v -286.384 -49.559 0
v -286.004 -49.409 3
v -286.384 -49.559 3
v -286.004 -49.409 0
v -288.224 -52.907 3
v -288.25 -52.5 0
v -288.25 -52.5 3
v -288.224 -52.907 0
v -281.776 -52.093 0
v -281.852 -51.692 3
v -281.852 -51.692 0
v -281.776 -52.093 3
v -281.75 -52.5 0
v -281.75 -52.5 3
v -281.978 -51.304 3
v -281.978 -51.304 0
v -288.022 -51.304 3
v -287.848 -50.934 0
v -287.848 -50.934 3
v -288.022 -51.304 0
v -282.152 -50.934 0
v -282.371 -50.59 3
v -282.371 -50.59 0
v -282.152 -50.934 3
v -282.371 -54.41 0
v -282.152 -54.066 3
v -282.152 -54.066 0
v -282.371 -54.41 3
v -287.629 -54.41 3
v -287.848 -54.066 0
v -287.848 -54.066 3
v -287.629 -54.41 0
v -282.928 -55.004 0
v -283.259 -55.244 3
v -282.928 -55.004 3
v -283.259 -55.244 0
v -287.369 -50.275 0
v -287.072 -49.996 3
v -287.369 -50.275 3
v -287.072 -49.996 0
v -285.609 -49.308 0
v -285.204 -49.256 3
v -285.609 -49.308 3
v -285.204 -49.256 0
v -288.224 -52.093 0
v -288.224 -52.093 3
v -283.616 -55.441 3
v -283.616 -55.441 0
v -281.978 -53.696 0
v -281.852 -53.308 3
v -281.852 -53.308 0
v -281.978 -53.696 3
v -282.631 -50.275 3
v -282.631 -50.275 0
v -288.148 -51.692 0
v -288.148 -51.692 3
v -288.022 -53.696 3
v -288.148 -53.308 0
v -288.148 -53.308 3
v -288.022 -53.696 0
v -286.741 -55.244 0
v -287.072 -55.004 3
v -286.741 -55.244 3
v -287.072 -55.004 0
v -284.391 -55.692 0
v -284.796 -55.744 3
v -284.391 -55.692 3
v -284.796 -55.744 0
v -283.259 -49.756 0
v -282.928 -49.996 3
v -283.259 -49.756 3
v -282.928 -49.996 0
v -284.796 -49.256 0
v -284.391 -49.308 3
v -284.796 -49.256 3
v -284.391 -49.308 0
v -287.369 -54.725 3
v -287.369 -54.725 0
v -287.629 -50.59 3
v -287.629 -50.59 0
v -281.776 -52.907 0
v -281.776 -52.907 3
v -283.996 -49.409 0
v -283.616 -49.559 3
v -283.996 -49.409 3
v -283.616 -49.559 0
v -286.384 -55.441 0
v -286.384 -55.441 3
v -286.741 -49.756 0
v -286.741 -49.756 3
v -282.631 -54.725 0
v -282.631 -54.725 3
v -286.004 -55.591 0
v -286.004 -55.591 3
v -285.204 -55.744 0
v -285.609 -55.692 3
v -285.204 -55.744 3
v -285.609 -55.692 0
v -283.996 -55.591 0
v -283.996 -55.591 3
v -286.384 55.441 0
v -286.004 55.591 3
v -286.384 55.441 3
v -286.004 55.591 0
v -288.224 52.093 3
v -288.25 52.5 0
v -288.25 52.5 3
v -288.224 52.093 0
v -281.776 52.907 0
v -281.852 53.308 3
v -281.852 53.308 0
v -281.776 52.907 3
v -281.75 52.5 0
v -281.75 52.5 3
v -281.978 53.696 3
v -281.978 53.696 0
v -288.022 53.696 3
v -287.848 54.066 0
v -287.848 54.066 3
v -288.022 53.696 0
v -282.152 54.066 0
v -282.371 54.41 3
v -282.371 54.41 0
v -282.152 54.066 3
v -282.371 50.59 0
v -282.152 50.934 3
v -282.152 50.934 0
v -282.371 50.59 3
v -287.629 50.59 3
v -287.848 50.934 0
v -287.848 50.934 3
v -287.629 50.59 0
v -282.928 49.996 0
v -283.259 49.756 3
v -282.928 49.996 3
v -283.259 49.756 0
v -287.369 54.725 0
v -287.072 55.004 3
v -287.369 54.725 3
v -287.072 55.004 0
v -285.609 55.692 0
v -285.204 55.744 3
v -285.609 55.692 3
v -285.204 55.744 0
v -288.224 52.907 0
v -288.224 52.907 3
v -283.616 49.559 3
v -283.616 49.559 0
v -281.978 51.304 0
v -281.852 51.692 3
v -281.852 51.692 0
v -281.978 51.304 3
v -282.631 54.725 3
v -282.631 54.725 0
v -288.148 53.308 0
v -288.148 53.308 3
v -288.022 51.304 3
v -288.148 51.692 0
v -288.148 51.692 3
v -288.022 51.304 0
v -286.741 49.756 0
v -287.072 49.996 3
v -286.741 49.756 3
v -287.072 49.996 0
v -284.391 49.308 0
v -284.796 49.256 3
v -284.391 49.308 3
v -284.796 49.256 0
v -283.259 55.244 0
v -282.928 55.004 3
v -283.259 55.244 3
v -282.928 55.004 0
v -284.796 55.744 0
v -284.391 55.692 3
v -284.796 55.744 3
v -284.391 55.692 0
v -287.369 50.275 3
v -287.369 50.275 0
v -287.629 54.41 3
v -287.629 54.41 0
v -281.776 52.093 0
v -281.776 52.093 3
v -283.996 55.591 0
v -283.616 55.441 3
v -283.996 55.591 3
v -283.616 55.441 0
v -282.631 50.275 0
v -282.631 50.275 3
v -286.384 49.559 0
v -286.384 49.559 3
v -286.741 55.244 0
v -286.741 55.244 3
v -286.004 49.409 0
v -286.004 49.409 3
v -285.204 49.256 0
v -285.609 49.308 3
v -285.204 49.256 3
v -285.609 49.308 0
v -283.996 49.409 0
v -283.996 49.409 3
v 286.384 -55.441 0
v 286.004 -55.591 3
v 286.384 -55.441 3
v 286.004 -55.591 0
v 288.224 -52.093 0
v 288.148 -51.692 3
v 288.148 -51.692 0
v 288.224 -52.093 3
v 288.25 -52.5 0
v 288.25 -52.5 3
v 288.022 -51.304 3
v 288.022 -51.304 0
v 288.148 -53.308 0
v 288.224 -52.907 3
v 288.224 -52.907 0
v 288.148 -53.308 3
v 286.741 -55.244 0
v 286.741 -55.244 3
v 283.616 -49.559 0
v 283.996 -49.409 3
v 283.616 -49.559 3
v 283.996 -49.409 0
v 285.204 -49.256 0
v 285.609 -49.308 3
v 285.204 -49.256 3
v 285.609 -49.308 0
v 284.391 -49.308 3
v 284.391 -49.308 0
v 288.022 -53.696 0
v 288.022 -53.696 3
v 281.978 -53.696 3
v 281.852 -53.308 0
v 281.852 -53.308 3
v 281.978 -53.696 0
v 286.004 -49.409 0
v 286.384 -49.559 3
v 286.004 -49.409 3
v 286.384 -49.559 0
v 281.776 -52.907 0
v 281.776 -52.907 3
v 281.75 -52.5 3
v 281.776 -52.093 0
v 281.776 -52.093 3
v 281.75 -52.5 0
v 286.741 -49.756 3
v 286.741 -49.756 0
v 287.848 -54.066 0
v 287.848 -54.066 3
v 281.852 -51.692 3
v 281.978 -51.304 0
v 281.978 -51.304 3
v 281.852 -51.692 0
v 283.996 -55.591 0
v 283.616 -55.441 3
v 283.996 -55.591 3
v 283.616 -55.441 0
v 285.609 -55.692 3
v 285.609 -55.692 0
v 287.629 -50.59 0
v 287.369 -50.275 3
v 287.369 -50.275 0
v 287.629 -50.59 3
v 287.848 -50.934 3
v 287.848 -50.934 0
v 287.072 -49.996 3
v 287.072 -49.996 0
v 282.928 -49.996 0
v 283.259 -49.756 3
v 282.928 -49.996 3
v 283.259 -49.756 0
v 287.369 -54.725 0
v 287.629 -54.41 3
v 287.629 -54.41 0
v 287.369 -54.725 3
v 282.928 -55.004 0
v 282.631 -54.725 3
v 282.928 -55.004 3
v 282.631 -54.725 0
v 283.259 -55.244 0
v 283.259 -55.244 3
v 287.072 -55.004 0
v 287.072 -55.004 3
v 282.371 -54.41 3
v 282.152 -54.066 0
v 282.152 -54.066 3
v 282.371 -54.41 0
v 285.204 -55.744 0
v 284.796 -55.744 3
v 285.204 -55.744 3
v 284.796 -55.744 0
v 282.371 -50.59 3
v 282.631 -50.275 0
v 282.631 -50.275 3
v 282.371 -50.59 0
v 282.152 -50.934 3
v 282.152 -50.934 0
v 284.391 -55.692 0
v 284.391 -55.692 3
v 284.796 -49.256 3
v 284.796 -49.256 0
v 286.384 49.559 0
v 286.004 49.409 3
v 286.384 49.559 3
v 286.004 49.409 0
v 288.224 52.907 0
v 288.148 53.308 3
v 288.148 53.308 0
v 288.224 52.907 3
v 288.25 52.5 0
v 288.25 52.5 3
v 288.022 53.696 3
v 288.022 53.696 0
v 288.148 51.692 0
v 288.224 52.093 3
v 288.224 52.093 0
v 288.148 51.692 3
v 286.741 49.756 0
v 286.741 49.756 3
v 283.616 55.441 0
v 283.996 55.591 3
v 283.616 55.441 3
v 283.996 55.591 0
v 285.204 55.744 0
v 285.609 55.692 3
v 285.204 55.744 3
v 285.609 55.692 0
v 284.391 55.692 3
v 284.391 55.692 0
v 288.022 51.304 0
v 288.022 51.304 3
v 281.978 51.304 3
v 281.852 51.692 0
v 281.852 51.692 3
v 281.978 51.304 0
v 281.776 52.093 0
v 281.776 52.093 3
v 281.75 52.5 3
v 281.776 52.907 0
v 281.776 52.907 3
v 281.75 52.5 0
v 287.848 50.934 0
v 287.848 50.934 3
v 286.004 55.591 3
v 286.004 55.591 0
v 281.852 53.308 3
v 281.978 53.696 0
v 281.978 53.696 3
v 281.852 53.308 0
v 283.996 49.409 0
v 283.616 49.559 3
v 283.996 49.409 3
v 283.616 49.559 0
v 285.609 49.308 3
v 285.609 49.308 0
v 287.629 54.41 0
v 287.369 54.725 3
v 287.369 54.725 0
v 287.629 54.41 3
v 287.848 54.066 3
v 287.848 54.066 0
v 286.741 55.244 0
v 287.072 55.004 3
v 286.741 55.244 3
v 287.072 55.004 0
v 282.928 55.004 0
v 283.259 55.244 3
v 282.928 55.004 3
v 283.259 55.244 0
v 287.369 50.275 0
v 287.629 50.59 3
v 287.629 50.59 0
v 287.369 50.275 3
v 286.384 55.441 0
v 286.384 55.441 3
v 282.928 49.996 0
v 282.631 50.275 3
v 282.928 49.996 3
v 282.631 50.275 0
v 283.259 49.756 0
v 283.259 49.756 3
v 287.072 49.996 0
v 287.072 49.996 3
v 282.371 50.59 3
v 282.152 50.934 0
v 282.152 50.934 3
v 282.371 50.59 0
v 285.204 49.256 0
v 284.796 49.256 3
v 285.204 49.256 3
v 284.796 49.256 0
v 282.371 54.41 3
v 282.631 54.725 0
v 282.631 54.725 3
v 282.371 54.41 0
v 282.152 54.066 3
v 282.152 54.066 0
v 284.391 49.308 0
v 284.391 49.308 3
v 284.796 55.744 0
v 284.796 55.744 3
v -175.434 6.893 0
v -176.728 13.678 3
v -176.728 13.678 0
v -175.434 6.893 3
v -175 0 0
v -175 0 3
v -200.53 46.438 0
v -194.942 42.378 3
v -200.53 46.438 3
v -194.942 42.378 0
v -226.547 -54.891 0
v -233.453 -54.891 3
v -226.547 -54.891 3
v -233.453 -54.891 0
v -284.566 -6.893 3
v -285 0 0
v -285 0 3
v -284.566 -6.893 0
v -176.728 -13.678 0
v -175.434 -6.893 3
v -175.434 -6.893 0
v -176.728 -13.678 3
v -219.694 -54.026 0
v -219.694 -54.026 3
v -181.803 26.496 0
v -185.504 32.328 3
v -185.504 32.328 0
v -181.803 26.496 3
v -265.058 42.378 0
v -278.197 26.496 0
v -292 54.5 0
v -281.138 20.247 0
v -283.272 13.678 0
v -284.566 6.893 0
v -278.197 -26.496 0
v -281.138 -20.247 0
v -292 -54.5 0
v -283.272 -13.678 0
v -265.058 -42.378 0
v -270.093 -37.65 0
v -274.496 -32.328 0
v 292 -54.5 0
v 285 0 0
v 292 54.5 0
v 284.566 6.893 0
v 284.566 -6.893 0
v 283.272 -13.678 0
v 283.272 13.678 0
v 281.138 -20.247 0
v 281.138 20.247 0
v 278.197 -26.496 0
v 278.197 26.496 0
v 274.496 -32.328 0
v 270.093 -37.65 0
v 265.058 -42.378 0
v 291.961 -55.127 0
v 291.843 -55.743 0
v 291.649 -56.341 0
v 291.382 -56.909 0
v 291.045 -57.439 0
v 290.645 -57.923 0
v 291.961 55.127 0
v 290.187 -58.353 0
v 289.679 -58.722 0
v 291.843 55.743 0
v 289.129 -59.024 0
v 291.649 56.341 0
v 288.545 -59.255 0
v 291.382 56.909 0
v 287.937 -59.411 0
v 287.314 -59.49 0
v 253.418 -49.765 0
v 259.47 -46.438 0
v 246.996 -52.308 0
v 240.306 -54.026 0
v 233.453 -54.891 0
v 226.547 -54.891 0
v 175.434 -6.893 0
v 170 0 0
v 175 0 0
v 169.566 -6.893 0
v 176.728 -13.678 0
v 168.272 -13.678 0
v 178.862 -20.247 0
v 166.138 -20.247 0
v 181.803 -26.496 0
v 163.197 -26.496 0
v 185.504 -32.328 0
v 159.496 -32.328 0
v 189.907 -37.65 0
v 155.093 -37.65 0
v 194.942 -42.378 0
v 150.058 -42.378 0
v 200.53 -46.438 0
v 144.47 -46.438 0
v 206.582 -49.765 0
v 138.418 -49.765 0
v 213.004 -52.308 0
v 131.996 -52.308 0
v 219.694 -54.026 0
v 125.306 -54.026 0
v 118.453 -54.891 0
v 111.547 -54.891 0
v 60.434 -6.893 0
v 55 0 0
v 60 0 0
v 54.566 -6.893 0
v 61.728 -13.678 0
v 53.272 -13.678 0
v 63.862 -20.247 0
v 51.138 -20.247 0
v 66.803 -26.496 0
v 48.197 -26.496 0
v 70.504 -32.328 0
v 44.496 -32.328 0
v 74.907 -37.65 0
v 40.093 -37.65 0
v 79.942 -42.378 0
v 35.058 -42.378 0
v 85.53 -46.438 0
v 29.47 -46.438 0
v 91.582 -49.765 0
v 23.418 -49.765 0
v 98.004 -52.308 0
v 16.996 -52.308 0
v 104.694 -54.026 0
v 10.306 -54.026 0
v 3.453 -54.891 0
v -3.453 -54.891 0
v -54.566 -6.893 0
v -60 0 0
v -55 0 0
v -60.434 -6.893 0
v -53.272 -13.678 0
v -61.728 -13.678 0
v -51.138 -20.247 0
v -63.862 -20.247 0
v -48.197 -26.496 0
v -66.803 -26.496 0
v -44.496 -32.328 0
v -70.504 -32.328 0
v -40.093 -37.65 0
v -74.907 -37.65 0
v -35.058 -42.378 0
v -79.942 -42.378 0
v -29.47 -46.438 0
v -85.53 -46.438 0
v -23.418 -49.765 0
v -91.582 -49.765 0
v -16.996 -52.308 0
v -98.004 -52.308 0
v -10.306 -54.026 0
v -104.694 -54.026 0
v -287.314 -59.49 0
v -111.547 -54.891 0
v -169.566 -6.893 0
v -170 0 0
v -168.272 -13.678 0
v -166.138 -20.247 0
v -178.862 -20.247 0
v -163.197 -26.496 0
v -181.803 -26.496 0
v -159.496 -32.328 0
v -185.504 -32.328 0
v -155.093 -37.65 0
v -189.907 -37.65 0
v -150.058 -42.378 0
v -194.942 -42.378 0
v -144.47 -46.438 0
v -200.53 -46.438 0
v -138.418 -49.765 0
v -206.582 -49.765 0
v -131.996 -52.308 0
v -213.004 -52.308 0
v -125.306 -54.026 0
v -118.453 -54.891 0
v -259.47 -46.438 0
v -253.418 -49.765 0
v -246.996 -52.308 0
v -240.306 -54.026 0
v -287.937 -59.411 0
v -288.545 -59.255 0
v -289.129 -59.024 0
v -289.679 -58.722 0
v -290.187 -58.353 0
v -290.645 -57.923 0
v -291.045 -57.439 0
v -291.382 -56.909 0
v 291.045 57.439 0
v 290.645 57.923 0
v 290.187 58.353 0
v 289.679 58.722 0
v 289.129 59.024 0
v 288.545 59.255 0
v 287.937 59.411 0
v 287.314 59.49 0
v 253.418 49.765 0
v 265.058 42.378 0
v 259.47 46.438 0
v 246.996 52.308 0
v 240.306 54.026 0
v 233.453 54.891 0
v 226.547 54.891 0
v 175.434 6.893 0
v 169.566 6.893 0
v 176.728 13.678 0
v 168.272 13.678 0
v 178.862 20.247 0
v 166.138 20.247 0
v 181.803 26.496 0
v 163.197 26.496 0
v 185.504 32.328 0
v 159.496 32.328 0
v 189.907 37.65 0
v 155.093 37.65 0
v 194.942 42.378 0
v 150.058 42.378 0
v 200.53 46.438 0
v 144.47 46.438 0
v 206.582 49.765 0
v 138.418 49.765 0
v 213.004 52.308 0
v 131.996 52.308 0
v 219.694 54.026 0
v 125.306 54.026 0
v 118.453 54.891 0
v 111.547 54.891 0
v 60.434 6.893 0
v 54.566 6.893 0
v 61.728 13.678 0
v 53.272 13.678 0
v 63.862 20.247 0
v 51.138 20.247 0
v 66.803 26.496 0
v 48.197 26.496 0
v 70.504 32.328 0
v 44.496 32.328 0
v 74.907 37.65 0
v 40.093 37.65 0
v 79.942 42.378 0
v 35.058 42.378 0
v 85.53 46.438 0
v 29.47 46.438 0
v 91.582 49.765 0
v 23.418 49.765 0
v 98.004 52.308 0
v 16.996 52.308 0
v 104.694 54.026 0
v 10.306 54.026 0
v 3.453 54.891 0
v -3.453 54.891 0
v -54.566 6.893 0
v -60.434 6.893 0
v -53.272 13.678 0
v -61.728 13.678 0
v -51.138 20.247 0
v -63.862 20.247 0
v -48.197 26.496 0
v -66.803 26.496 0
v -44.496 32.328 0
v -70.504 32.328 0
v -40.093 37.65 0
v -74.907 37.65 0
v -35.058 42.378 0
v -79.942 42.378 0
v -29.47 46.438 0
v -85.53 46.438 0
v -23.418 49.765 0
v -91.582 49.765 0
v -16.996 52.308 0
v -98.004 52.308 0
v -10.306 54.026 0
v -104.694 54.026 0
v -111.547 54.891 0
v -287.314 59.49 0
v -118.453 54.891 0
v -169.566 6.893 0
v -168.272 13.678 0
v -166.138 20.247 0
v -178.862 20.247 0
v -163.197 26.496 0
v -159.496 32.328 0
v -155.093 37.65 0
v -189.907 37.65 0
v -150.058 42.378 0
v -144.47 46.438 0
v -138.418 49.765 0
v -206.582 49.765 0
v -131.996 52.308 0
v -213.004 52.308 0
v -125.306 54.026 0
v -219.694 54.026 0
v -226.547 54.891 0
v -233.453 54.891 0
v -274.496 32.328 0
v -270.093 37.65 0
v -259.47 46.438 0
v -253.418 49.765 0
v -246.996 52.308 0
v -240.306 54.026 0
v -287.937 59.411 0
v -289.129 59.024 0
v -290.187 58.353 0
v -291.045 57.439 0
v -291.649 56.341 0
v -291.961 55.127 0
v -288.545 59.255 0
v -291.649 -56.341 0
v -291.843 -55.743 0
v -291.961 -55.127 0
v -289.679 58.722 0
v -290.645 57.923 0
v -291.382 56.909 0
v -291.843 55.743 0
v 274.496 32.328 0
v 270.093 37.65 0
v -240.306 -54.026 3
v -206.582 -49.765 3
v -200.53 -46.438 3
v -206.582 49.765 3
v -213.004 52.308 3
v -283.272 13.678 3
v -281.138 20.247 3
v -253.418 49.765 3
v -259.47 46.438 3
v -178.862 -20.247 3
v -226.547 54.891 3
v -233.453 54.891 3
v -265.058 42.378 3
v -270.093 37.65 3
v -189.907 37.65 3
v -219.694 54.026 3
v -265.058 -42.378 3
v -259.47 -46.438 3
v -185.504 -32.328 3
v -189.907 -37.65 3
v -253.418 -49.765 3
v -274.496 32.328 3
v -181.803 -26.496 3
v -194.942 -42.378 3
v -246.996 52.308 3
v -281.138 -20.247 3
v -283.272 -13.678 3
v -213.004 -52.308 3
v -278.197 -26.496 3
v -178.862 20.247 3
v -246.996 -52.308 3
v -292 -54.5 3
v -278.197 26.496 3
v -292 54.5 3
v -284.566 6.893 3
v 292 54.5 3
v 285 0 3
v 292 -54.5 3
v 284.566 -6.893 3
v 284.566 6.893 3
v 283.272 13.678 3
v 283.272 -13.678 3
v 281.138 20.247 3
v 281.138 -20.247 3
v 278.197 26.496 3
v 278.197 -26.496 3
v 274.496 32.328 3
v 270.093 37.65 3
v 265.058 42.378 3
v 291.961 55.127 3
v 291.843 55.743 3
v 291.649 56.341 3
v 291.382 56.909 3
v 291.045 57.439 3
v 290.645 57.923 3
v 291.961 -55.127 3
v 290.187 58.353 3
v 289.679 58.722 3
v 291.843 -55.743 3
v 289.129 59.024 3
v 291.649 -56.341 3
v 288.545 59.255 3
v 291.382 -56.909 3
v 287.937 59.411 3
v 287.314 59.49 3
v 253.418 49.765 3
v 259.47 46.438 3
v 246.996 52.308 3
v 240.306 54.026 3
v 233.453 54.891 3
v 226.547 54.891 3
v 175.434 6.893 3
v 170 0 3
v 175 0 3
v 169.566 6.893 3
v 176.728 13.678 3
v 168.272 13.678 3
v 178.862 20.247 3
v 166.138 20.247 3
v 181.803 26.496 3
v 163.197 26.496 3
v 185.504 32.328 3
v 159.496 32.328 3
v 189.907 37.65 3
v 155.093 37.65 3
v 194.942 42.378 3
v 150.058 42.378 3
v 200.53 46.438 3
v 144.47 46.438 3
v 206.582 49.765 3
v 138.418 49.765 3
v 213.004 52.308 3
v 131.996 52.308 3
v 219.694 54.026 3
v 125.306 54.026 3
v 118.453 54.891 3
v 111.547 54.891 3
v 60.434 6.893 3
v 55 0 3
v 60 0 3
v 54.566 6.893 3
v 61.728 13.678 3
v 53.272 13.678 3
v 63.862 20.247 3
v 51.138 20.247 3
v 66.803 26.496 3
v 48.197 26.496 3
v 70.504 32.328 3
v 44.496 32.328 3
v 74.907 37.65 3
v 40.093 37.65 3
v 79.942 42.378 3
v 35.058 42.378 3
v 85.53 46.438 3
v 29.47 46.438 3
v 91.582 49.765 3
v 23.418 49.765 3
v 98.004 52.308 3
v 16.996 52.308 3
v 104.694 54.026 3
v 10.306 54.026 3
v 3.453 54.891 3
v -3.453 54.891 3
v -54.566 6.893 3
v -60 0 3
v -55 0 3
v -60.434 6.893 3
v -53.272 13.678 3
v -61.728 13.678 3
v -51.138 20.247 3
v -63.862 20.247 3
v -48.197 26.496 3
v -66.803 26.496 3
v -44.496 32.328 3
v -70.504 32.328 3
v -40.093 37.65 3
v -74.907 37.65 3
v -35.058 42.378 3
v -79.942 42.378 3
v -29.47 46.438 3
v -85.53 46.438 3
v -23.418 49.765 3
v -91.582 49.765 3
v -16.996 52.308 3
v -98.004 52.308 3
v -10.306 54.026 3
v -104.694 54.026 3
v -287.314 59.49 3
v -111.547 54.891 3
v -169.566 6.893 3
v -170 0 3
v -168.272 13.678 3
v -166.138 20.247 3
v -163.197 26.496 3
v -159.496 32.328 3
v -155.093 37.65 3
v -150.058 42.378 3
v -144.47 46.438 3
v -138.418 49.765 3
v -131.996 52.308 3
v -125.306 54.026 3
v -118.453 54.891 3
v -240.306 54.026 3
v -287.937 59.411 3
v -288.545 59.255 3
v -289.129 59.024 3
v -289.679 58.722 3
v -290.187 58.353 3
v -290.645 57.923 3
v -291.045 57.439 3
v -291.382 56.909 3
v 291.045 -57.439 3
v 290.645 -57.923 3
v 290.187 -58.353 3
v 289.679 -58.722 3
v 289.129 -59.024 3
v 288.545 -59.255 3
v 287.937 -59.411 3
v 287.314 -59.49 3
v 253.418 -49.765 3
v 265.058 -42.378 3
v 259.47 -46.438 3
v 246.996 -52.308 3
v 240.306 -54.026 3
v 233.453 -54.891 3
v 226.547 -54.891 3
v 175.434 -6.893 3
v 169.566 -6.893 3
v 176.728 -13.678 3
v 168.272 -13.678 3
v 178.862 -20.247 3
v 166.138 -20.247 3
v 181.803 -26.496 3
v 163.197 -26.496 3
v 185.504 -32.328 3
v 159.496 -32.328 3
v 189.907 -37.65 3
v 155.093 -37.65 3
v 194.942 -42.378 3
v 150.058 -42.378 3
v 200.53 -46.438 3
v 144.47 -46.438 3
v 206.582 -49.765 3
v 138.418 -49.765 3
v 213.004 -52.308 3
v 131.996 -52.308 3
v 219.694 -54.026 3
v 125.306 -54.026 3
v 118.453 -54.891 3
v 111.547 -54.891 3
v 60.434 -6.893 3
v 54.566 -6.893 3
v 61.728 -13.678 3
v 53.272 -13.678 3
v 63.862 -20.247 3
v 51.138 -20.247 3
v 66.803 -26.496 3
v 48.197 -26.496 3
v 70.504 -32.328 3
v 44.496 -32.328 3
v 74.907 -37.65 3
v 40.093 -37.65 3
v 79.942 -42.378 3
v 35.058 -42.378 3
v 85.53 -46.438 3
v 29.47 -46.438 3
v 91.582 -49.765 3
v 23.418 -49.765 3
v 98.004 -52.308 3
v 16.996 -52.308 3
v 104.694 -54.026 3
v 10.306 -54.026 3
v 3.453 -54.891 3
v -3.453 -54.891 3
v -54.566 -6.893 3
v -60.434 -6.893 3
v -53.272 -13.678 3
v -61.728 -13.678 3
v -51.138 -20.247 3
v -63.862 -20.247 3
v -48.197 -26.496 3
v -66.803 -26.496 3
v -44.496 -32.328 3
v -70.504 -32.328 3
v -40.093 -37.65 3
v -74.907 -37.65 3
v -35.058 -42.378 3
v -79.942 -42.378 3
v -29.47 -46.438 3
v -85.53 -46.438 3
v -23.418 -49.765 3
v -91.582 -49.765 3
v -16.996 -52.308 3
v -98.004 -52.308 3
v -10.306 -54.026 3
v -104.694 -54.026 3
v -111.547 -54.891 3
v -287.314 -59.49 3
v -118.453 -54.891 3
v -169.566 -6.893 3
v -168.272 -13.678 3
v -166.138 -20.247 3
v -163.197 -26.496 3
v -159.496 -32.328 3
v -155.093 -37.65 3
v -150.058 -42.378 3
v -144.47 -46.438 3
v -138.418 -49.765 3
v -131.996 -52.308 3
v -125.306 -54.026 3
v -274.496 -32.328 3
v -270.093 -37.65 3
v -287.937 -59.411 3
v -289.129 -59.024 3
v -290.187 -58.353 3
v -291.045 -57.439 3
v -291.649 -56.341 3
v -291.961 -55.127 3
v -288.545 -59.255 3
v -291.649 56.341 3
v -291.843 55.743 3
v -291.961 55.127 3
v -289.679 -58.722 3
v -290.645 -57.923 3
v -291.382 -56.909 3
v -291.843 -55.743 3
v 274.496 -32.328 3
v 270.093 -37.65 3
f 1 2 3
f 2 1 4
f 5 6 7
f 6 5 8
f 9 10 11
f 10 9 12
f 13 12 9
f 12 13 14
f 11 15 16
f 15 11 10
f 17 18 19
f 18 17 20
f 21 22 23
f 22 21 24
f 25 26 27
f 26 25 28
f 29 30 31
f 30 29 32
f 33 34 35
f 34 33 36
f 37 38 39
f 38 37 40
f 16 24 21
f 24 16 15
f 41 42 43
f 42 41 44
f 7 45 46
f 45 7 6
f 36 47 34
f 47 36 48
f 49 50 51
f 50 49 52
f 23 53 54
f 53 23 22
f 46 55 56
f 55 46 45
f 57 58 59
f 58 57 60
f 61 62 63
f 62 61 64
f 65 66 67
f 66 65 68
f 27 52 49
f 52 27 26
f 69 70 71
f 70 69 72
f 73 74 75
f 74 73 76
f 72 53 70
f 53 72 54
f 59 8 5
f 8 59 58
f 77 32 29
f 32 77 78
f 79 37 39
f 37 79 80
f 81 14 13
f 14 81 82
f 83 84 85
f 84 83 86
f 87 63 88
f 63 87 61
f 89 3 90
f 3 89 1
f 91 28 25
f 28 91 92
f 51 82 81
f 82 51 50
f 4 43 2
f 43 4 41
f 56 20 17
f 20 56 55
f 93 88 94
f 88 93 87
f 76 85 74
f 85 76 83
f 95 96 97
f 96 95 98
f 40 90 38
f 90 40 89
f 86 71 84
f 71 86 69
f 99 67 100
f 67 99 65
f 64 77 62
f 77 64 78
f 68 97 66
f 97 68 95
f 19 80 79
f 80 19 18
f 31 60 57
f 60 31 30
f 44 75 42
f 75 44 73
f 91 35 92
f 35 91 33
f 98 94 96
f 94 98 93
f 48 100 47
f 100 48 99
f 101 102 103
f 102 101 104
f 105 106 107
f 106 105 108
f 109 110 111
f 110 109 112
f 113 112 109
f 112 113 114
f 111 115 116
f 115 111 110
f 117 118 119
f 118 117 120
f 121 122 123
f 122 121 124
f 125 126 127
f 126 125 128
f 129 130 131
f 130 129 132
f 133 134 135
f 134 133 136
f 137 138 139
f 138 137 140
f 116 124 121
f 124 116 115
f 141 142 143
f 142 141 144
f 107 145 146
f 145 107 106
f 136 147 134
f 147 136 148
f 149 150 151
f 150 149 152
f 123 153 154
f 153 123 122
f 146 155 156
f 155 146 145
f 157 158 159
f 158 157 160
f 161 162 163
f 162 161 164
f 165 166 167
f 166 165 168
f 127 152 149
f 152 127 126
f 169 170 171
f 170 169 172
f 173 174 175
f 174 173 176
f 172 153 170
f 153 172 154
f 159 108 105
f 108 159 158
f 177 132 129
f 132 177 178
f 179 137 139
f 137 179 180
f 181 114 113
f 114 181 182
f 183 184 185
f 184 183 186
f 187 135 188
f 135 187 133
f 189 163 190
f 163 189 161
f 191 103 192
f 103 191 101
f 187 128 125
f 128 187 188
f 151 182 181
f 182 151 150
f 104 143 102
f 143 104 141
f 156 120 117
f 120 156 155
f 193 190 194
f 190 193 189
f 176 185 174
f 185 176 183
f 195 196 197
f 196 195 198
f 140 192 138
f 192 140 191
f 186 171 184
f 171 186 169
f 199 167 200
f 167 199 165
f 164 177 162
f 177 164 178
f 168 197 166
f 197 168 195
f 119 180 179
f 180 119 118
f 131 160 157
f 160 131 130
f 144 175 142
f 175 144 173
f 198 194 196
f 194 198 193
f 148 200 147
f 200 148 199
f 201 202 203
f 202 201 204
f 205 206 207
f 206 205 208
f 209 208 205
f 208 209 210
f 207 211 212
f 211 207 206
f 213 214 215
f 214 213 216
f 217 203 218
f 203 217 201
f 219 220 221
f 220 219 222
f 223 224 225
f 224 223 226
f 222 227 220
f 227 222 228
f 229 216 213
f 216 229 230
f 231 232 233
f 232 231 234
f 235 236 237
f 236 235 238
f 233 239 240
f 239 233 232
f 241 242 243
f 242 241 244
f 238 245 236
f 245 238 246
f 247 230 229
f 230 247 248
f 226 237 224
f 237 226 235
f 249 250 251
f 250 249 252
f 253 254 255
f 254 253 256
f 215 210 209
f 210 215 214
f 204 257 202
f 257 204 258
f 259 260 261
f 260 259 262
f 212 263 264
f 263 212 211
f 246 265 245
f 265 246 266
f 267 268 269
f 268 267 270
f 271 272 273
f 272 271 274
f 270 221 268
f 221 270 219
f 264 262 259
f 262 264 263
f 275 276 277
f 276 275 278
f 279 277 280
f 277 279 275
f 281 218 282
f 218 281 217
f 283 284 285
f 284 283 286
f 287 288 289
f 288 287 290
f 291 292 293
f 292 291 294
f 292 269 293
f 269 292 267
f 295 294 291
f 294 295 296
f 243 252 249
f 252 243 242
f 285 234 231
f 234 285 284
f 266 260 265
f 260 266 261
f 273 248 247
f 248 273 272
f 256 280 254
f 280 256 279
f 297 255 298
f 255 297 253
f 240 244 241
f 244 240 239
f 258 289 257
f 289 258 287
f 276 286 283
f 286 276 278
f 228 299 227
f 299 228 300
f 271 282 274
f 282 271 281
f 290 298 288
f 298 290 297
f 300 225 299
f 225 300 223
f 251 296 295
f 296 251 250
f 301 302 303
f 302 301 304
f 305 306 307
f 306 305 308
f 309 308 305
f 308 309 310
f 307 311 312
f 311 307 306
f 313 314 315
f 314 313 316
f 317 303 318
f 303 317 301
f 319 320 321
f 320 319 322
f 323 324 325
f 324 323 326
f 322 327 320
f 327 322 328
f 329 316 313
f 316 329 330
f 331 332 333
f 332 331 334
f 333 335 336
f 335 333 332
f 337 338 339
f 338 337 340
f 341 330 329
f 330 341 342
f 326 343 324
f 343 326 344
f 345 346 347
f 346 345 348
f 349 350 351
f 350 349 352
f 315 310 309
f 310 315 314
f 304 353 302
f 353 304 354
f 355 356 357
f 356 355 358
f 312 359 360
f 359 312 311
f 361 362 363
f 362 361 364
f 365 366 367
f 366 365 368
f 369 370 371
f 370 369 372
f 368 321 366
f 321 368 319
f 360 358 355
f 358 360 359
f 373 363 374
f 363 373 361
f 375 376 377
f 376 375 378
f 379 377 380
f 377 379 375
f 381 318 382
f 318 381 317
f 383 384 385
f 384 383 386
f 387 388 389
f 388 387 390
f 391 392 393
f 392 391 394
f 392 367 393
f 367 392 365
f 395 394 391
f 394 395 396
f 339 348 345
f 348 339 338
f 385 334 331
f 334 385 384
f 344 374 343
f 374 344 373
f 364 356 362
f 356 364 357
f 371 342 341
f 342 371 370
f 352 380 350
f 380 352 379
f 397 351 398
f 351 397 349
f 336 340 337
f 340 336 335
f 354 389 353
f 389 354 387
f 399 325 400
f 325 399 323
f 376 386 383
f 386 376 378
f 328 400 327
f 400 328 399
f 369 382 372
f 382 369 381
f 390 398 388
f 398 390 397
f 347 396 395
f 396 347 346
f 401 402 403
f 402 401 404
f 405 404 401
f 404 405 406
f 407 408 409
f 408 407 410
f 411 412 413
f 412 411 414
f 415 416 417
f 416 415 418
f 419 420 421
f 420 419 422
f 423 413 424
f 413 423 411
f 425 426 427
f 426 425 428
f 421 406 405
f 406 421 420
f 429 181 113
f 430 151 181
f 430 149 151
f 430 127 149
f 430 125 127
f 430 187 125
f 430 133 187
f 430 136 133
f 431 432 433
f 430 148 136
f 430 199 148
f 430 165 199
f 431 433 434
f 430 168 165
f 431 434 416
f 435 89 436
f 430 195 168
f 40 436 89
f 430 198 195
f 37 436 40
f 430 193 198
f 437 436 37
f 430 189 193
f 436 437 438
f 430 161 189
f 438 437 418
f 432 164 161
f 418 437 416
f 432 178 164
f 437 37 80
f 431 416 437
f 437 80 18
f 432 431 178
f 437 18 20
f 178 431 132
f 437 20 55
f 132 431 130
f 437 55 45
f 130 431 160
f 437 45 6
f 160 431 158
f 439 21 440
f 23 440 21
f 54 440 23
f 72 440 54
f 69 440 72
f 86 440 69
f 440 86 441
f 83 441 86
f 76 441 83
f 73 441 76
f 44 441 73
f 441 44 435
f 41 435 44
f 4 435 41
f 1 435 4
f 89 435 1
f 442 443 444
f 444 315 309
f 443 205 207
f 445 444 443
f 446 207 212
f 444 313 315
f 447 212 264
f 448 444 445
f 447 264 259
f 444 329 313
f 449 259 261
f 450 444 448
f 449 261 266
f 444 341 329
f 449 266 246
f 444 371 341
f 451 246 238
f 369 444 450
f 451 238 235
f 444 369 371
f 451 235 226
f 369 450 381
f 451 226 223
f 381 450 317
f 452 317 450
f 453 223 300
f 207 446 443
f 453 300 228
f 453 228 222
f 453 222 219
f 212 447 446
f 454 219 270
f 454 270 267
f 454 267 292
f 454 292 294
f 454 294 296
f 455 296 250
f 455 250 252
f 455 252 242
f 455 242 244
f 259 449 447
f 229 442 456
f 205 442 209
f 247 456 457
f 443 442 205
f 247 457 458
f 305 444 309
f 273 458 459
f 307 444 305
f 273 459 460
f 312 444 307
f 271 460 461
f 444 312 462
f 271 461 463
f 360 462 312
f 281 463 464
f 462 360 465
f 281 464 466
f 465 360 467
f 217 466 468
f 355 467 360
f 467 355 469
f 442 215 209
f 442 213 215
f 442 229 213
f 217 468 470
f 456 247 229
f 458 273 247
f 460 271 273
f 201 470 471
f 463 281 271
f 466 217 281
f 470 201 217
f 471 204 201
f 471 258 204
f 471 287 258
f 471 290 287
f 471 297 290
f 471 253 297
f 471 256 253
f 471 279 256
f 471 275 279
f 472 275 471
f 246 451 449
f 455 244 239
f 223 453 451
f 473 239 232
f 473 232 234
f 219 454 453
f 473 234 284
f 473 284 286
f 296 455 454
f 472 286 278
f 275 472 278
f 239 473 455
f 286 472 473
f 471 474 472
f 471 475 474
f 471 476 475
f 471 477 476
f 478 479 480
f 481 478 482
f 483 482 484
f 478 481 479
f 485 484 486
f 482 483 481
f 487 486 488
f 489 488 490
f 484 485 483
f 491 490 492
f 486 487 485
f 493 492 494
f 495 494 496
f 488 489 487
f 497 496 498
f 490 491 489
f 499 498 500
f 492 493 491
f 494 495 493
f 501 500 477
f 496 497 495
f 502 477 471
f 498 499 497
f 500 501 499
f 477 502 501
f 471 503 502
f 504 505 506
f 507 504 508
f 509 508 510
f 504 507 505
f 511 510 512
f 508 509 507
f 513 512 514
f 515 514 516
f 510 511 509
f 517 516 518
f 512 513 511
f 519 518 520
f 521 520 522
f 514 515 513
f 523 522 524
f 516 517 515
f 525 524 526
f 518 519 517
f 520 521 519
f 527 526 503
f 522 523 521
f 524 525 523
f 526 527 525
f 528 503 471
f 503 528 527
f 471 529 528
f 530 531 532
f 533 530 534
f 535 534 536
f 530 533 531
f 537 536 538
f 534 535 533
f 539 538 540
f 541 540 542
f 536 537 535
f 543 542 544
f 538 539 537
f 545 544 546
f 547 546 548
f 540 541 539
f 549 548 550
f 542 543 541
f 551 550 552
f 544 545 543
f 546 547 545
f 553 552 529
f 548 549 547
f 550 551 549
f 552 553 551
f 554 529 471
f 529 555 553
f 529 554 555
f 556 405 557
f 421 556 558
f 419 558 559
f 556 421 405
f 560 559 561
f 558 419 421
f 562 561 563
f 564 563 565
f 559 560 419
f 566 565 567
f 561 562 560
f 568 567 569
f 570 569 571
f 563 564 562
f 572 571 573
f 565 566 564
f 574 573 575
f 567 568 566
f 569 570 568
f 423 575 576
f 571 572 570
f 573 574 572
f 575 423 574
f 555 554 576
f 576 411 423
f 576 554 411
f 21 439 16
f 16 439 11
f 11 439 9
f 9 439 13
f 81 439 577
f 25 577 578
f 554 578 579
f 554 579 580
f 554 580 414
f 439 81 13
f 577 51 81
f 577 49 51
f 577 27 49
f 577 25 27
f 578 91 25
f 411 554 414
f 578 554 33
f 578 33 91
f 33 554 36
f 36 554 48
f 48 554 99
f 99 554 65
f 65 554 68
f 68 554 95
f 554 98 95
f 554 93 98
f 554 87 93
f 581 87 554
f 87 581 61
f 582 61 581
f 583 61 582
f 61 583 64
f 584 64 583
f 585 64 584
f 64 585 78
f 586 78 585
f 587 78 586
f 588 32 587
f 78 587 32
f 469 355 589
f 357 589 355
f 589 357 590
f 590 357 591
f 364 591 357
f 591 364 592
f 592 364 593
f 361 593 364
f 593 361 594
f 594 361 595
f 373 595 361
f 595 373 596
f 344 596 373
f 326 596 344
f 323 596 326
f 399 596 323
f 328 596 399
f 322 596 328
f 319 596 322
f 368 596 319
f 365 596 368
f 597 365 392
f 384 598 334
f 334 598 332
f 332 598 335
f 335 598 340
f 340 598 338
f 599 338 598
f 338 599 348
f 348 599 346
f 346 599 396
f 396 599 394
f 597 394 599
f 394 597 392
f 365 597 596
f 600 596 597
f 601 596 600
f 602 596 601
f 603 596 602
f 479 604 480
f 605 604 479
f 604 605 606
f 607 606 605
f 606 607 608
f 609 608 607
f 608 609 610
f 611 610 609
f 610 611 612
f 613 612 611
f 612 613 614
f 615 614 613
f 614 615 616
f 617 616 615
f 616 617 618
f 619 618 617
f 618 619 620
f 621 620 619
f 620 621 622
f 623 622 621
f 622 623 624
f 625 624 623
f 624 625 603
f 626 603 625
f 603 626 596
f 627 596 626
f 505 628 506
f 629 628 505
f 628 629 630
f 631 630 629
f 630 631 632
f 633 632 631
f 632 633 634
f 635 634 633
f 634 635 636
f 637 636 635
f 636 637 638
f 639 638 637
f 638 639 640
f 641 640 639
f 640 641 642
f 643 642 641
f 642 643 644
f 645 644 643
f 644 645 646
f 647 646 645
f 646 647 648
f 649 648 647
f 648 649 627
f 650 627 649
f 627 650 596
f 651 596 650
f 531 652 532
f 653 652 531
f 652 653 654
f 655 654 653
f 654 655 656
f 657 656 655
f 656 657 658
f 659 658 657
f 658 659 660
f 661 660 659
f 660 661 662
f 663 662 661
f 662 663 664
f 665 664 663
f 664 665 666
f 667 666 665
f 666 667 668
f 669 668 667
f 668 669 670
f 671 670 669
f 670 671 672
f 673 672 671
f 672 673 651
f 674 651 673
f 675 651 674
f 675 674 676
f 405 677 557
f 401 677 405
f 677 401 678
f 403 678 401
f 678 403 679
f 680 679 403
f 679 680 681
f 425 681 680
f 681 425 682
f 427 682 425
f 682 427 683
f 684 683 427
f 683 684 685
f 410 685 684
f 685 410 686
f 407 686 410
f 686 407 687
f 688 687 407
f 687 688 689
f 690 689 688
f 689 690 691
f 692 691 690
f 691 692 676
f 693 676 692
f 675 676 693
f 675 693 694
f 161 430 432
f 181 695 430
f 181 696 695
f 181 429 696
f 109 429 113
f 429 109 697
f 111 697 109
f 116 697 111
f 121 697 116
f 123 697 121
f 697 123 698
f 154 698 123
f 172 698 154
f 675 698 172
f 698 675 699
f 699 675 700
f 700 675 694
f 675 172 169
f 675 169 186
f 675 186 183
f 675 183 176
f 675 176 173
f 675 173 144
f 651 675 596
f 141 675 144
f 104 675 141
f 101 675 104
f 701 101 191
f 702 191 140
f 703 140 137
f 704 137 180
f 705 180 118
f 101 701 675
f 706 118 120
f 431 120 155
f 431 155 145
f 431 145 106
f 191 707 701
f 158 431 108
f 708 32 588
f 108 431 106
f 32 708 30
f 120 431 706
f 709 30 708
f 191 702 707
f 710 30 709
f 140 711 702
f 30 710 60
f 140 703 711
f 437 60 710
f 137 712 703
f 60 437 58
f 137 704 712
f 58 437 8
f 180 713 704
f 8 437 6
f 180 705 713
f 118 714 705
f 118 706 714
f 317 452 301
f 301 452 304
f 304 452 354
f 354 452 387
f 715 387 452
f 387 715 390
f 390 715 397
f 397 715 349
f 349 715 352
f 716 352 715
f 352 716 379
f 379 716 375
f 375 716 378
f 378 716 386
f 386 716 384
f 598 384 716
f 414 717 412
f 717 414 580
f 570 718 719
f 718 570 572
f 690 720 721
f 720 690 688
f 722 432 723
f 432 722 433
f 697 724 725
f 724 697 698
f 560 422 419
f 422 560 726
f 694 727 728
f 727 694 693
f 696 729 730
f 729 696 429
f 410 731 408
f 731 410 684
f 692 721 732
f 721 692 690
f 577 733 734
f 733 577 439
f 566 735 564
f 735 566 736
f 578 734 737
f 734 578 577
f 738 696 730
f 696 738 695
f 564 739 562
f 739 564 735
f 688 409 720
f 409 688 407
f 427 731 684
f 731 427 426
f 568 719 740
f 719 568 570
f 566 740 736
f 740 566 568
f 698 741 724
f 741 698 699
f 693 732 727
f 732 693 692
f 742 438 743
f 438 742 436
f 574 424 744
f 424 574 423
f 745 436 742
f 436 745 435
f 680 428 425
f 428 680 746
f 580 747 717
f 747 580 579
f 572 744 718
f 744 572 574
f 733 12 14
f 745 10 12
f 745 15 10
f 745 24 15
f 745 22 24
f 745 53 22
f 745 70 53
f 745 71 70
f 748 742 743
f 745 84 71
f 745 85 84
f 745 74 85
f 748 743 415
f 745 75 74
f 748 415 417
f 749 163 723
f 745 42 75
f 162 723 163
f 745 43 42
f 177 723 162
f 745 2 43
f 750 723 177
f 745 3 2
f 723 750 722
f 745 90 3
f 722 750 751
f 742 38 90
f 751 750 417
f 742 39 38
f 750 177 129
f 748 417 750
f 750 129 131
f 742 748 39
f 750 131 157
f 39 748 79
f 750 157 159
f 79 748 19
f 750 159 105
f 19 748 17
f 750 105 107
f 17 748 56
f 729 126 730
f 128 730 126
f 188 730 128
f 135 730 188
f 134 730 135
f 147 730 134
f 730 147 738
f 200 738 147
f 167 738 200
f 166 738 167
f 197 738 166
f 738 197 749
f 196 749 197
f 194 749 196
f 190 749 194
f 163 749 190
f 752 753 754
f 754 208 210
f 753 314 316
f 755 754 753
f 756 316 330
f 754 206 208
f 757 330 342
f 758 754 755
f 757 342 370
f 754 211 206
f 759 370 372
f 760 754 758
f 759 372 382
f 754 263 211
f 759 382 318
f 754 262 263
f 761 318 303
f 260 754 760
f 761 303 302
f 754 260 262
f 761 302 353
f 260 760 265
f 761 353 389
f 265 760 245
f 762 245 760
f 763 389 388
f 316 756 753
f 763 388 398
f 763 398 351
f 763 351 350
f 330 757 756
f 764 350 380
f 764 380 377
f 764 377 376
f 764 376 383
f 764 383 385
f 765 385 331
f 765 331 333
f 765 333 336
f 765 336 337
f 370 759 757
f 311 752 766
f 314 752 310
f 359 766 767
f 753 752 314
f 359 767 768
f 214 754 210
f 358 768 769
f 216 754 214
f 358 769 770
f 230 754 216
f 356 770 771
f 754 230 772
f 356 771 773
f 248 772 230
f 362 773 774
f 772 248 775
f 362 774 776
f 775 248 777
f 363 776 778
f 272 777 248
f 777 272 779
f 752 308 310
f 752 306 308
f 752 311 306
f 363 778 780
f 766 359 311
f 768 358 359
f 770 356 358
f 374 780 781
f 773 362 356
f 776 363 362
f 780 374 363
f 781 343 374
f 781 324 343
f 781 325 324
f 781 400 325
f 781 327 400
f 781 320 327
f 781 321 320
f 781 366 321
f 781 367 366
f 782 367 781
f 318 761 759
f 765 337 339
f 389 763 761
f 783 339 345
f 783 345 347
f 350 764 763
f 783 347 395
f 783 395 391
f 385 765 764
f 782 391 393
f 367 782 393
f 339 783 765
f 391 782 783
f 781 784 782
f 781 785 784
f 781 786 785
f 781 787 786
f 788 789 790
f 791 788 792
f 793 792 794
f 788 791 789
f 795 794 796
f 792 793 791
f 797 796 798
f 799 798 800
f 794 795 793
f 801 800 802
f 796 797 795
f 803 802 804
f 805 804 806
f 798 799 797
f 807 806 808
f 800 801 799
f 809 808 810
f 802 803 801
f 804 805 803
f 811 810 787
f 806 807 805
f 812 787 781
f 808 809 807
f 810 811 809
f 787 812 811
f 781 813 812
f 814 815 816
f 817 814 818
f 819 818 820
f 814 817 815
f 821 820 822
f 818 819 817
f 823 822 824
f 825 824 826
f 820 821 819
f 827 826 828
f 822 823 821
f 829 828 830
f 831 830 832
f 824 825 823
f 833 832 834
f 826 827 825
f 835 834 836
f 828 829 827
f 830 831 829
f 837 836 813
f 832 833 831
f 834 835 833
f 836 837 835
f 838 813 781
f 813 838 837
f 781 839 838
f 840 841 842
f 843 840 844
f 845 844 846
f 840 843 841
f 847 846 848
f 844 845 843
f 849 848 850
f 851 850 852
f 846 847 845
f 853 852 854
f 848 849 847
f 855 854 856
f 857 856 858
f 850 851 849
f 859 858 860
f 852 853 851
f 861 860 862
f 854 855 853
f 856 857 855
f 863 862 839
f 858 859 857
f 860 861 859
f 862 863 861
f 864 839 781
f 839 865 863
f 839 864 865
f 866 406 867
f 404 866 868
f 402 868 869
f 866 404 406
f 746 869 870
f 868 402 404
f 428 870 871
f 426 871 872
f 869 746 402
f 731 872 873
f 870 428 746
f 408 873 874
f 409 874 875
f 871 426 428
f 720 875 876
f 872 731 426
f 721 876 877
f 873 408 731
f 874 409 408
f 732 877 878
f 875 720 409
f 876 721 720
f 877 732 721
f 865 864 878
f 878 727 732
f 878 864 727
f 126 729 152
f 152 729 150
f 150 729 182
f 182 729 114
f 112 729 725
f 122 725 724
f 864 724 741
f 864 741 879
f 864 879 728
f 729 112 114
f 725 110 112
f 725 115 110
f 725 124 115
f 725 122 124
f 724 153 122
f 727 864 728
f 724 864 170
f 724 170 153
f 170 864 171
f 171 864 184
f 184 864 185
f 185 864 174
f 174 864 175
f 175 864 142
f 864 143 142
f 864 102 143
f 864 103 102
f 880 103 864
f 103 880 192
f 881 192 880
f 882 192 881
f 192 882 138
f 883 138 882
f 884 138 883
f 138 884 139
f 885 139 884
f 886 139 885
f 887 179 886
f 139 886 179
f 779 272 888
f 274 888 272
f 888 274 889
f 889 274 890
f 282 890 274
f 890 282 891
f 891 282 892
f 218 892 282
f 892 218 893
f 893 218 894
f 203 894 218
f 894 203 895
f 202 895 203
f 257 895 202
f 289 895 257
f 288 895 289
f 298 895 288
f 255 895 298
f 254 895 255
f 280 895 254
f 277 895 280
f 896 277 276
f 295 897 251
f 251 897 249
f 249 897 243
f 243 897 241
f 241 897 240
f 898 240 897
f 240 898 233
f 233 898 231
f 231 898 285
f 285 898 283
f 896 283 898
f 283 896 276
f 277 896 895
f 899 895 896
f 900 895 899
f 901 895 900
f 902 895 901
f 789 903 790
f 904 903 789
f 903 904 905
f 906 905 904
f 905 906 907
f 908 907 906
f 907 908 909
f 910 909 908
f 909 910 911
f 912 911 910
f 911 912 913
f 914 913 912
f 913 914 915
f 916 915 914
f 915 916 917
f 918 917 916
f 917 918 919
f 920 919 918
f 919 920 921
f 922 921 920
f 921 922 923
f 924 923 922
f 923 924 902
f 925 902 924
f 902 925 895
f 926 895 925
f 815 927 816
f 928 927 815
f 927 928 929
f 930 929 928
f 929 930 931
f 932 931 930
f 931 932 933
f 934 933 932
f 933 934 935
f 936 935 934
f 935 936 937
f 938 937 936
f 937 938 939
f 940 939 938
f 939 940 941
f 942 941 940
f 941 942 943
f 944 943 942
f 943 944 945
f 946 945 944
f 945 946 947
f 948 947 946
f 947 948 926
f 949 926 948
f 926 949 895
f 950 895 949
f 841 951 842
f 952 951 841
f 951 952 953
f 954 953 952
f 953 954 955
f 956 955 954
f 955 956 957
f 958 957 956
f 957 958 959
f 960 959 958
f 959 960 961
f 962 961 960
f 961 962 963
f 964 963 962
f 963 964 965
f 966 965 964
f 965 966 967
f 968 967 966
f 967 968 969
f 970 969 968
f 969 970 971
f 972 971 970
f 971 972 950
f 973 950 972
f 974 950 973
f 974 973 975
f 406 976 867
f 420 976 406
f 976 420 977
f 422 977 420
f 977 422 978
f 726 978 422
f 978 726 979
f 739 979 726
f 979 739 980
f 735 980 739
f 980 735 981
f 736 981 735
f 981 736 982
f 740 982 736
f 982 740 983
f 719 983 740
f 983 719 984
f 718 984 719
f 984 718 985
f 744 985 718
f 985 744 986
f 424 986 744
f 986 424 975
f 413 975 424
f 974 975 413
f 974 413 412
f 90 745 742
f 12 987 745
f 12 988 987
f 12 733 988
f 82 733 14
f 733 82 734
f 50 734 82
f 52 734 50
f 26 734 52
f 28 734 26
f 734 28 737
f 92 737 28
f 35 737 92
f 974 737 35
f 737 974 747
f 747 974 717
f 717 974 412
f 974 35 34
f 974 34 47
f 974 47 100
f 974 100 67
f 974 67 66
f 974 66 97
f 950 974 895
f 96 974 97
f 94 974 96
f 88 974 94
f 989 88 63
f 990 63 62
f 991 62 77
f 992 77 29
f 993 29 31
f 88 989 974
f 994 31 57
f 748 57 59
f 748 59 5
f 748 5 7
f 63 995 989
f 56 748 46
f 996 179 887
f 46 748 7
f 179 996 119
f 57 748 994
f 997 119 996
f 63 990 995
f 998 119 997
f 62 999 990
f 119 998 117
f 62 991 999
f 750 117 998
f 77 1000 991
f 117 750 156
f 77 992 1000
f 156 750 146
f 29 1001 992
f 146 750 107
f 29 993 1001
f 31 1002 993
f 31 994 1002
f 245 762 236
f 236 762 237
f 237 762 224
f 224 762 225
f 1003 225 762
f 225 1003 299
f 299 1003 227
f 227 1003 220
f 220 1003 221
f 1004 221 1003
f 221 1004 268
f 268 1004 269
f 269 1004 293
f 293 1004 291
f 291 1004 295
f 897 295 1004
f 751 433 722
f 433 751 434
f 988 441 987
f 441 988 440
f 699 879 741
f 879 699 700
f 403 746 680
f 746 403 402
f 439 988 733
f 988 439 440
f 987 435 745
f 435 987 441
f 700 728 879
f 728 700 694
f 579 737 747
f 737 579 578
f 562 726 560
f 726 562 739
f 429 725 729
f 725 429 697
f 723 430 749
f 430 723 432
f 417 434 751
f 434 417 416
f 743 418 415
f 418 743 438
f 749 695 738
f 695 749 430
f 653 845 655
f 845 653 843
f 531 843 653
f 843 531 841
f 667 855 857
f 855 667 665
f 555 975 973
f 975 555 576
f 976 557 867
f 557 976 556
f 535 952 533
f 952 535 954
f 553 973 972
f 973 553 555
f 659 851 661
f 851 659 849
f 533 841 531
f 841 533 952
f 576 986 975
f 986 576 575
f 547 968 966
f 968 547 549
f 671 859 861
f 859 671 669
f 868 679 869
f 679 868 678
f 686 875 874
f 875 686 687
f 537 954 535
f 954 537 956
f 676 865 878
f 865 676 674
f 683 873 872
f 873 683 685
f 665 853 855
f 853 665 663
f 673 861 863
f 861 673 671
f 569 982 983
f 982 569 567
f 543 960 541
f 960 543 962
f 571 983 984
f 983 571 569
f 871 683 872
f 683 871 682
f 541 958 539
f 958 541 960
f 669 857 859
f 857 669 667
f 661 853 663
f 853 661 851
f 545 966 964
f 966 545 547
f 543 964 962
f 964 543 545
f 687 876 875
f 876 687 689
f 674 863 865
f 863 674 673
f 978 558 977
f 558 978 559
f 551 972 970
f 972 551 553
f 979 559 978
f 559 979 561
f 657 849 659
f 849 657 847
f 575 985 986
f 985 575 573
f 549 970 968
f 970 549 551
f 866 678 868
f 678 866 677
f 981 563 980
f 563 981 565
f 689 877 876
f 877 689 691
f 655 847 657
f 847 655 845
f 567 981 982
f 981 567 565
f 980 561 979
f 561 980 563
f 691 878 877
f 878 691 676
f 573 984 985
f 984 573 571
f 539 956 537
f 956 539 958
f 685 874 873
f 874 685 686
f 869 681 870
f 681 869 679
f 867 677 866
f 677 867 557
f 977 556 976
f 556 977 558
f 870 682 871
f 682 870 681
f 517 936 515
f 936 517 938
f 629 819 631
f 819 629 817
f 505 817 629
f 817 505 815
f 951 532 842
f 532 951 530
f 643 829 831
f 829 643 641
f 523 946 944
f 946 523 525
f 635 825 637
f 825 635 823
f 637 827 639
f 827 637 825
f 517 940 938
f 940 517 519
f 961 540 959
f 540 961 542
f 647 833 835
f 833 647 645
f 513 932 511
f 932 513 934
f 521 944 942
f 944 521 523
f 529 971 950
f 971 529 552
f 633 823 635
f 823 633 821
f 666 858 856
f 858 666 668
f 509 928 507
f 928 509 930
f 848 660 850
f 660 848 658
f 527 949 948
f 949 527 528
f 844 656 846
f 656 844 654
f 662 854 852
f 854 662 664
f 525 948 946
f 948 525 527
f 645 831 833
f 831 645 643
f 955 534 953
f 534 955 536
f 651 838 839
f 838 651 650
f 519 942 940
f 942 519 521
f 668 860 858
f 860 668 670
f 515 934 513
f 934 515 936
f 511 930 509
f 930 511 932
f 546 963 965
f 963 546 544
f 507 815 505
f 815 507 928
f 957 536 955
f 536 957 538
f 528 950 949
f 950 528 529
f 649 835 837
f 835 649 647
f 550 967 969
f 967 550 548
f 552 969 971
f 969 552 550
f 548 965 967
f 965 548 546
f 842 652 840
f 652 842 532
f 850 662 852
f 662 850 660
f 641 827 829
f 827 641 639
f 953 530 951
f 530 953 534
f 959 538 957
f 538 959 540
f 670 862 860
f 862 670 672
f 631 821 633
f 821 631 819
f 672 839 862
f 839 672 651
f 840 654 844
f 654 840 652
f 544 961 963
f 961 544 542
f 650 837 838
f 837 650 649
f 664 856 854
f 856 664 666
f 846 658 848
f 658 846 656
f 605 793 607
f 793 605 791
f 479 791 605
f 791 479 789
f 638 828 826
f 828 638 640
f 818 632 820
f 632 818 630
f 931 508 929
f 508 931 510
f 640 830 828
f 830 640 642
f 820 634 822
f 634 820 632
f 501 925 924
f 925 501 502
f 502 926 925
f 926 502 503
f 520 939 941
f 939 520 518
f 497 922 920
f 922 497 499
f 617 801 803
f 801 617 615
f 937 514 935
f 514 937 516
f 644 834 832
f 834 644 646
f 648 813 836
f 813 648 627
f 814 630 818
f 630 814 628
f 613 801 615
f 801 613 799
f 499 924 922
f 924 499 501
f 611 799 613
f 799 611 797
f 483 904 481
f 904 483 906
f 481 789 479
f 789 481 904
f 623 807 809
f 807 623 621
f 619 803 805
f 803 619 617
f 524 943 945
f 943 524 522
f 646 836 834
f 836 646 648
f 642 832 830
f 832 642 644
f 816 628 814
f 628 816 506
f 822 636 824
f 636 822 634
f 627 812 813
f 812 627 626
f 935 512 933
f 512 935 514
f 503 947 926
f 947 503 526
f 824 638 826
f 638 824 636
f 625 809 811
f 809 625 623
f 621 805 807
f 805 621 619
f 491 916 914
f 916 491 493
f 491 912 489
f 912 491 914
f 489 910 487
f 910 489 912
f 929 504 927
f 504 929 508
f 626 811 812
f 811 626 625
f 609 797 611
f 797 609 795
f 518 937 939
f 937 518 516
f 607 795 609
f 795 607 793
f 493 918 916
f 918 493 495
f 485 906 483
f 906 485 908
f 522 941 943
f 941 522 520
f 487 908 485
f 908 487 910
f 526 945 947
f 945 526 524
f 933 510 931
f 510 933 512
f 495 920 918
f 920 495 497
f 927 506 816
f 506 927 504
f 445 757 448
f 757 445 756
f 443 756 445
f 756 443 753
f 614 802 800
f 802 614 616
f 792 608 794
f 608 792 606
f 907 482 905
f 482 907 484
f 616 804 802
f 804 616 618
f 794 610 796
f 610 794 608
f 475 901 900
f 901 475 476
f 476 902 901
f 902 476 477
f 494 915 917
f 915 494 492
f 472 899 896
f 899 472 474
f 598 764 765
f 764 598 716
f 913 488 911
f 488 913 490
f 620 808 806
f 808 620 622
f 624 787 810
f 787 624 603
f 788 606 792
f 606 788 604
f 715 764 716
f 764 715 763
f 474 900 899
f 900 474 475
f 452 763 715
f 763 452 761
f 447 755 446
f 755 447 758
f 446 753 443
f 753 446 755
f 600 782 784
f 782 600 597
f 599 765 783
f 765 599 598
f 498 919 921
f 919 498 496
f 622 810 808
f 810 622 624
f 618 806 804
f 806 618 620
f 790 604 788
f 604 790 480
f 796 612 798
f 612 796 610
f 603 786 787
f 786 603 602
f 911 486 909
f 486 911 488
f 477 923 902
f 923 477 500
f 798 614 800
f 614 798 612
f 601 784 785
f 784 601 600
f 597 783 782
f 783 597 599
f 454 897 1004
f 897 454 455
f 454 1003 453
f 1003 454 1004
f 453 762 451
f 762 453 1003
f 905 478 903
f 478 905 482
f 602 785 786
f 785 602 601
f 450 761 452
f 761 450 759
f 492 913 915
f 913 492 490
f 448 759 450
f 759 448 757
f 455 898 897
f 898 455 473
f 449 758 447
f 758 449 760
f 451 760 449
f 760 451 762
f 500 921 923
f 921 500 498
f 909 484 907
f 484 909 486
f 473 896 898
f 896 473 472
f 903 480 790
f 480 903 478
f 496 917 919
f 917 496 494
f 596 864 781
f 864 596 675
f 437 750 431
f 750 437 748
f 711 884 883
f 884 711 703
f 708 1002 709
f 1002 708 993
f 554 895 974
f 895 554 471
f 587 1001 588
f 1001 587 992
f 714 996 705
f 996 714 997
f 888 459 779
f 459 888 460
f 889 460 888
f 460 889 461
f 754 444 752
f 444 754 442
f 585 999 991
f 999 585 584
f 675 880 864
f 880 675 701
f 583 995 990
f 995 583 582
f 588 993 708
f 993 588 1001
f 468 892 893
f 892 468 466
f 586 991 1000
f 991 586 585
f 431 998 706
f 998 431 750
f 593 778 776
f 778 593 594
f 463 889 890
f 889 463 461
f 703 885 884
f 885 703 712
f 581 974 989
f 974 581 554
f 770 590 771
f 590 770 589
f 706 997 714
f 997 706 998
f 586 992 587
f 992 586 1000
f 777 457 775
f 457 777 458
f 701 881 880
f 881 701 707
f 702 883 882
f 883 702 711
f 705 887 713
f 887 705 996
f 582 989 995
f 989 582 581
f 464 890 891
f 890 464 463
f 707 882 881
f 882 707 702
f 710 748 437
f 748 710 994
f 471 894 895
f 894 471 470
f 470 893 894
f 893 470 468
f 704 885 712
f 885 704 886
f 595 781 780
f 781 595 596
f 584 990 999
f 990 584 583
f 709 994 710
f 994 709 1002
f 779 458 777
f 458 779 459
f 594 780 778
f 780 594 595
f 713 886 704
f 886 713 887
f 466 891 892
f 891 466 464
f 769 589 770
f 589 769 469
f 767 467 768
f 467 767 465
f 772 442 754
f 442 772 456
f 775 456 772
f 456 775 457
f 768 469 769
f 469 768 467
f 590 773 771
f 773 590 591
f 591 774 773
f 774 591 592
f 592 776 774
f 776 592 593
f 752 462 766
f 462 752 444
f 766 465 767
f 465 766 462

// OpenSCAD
$fn = 50;


difference() {
	union() {
		hull() {
			translate(v = [-287.0000000000, 54.5000000000, 0]) {
				cylinder(h = 3, r = 5);
			}
			translate(v = [287.0000000000, 54.5000000000, 0]) {
				cylinder(h = 3, r = 5);
			}
			translate(v = [-287.0000000000, -54.5000000000, 0]) {
				cylinder(h = 3, r = 5);
			}
			translate(v = [287.0000000000, -54.5000000000, 0]) {
				cylinder(h = 3, r = 5);
			}
		}
	}
	union() {
		#translate(v = [-285.0000000000, -52.5000000000, -100.0000000000]) {
			cylinder(h = 200, r = 3.2500000000);
		}
		#translate(v = [-285.0000000000, 52.5000000000, -100.0000000000]) {
			cylinder(h = 200, r = 3.2500000000);
		}
		#translate(v = [285.0000000000, -52.5000000000, -100.0000000000]) {
			cylinder(h = 200, r = 3.2500000000);
		}
		#translate(v = [285.0000000000, 52.5000000000, -100.0000000000]) {
			cylinder(h = 200, r = 3.2500000000);
		}
		#translate(v = [-230.0000000000, 0, 0]) {
			cylinder(h = 3, r = 55.0000000000);
		}
		#translate(v = [-115.0000000000, 0, 0]) {
			cylinder(h = 3, r = 55.0000000000);
		}
		#cylinder(h = 3, r = 55.0000000000);
		#translate(v = [115.0000000000, 0, 0]) {
			cylinder(h = 3, r = 55.0000000000);
		}
		#translate(v = [230.0000000000, 0, 0]) {
			cylinder(h = 3, r = 55.0000000000);
		}
	}
}
